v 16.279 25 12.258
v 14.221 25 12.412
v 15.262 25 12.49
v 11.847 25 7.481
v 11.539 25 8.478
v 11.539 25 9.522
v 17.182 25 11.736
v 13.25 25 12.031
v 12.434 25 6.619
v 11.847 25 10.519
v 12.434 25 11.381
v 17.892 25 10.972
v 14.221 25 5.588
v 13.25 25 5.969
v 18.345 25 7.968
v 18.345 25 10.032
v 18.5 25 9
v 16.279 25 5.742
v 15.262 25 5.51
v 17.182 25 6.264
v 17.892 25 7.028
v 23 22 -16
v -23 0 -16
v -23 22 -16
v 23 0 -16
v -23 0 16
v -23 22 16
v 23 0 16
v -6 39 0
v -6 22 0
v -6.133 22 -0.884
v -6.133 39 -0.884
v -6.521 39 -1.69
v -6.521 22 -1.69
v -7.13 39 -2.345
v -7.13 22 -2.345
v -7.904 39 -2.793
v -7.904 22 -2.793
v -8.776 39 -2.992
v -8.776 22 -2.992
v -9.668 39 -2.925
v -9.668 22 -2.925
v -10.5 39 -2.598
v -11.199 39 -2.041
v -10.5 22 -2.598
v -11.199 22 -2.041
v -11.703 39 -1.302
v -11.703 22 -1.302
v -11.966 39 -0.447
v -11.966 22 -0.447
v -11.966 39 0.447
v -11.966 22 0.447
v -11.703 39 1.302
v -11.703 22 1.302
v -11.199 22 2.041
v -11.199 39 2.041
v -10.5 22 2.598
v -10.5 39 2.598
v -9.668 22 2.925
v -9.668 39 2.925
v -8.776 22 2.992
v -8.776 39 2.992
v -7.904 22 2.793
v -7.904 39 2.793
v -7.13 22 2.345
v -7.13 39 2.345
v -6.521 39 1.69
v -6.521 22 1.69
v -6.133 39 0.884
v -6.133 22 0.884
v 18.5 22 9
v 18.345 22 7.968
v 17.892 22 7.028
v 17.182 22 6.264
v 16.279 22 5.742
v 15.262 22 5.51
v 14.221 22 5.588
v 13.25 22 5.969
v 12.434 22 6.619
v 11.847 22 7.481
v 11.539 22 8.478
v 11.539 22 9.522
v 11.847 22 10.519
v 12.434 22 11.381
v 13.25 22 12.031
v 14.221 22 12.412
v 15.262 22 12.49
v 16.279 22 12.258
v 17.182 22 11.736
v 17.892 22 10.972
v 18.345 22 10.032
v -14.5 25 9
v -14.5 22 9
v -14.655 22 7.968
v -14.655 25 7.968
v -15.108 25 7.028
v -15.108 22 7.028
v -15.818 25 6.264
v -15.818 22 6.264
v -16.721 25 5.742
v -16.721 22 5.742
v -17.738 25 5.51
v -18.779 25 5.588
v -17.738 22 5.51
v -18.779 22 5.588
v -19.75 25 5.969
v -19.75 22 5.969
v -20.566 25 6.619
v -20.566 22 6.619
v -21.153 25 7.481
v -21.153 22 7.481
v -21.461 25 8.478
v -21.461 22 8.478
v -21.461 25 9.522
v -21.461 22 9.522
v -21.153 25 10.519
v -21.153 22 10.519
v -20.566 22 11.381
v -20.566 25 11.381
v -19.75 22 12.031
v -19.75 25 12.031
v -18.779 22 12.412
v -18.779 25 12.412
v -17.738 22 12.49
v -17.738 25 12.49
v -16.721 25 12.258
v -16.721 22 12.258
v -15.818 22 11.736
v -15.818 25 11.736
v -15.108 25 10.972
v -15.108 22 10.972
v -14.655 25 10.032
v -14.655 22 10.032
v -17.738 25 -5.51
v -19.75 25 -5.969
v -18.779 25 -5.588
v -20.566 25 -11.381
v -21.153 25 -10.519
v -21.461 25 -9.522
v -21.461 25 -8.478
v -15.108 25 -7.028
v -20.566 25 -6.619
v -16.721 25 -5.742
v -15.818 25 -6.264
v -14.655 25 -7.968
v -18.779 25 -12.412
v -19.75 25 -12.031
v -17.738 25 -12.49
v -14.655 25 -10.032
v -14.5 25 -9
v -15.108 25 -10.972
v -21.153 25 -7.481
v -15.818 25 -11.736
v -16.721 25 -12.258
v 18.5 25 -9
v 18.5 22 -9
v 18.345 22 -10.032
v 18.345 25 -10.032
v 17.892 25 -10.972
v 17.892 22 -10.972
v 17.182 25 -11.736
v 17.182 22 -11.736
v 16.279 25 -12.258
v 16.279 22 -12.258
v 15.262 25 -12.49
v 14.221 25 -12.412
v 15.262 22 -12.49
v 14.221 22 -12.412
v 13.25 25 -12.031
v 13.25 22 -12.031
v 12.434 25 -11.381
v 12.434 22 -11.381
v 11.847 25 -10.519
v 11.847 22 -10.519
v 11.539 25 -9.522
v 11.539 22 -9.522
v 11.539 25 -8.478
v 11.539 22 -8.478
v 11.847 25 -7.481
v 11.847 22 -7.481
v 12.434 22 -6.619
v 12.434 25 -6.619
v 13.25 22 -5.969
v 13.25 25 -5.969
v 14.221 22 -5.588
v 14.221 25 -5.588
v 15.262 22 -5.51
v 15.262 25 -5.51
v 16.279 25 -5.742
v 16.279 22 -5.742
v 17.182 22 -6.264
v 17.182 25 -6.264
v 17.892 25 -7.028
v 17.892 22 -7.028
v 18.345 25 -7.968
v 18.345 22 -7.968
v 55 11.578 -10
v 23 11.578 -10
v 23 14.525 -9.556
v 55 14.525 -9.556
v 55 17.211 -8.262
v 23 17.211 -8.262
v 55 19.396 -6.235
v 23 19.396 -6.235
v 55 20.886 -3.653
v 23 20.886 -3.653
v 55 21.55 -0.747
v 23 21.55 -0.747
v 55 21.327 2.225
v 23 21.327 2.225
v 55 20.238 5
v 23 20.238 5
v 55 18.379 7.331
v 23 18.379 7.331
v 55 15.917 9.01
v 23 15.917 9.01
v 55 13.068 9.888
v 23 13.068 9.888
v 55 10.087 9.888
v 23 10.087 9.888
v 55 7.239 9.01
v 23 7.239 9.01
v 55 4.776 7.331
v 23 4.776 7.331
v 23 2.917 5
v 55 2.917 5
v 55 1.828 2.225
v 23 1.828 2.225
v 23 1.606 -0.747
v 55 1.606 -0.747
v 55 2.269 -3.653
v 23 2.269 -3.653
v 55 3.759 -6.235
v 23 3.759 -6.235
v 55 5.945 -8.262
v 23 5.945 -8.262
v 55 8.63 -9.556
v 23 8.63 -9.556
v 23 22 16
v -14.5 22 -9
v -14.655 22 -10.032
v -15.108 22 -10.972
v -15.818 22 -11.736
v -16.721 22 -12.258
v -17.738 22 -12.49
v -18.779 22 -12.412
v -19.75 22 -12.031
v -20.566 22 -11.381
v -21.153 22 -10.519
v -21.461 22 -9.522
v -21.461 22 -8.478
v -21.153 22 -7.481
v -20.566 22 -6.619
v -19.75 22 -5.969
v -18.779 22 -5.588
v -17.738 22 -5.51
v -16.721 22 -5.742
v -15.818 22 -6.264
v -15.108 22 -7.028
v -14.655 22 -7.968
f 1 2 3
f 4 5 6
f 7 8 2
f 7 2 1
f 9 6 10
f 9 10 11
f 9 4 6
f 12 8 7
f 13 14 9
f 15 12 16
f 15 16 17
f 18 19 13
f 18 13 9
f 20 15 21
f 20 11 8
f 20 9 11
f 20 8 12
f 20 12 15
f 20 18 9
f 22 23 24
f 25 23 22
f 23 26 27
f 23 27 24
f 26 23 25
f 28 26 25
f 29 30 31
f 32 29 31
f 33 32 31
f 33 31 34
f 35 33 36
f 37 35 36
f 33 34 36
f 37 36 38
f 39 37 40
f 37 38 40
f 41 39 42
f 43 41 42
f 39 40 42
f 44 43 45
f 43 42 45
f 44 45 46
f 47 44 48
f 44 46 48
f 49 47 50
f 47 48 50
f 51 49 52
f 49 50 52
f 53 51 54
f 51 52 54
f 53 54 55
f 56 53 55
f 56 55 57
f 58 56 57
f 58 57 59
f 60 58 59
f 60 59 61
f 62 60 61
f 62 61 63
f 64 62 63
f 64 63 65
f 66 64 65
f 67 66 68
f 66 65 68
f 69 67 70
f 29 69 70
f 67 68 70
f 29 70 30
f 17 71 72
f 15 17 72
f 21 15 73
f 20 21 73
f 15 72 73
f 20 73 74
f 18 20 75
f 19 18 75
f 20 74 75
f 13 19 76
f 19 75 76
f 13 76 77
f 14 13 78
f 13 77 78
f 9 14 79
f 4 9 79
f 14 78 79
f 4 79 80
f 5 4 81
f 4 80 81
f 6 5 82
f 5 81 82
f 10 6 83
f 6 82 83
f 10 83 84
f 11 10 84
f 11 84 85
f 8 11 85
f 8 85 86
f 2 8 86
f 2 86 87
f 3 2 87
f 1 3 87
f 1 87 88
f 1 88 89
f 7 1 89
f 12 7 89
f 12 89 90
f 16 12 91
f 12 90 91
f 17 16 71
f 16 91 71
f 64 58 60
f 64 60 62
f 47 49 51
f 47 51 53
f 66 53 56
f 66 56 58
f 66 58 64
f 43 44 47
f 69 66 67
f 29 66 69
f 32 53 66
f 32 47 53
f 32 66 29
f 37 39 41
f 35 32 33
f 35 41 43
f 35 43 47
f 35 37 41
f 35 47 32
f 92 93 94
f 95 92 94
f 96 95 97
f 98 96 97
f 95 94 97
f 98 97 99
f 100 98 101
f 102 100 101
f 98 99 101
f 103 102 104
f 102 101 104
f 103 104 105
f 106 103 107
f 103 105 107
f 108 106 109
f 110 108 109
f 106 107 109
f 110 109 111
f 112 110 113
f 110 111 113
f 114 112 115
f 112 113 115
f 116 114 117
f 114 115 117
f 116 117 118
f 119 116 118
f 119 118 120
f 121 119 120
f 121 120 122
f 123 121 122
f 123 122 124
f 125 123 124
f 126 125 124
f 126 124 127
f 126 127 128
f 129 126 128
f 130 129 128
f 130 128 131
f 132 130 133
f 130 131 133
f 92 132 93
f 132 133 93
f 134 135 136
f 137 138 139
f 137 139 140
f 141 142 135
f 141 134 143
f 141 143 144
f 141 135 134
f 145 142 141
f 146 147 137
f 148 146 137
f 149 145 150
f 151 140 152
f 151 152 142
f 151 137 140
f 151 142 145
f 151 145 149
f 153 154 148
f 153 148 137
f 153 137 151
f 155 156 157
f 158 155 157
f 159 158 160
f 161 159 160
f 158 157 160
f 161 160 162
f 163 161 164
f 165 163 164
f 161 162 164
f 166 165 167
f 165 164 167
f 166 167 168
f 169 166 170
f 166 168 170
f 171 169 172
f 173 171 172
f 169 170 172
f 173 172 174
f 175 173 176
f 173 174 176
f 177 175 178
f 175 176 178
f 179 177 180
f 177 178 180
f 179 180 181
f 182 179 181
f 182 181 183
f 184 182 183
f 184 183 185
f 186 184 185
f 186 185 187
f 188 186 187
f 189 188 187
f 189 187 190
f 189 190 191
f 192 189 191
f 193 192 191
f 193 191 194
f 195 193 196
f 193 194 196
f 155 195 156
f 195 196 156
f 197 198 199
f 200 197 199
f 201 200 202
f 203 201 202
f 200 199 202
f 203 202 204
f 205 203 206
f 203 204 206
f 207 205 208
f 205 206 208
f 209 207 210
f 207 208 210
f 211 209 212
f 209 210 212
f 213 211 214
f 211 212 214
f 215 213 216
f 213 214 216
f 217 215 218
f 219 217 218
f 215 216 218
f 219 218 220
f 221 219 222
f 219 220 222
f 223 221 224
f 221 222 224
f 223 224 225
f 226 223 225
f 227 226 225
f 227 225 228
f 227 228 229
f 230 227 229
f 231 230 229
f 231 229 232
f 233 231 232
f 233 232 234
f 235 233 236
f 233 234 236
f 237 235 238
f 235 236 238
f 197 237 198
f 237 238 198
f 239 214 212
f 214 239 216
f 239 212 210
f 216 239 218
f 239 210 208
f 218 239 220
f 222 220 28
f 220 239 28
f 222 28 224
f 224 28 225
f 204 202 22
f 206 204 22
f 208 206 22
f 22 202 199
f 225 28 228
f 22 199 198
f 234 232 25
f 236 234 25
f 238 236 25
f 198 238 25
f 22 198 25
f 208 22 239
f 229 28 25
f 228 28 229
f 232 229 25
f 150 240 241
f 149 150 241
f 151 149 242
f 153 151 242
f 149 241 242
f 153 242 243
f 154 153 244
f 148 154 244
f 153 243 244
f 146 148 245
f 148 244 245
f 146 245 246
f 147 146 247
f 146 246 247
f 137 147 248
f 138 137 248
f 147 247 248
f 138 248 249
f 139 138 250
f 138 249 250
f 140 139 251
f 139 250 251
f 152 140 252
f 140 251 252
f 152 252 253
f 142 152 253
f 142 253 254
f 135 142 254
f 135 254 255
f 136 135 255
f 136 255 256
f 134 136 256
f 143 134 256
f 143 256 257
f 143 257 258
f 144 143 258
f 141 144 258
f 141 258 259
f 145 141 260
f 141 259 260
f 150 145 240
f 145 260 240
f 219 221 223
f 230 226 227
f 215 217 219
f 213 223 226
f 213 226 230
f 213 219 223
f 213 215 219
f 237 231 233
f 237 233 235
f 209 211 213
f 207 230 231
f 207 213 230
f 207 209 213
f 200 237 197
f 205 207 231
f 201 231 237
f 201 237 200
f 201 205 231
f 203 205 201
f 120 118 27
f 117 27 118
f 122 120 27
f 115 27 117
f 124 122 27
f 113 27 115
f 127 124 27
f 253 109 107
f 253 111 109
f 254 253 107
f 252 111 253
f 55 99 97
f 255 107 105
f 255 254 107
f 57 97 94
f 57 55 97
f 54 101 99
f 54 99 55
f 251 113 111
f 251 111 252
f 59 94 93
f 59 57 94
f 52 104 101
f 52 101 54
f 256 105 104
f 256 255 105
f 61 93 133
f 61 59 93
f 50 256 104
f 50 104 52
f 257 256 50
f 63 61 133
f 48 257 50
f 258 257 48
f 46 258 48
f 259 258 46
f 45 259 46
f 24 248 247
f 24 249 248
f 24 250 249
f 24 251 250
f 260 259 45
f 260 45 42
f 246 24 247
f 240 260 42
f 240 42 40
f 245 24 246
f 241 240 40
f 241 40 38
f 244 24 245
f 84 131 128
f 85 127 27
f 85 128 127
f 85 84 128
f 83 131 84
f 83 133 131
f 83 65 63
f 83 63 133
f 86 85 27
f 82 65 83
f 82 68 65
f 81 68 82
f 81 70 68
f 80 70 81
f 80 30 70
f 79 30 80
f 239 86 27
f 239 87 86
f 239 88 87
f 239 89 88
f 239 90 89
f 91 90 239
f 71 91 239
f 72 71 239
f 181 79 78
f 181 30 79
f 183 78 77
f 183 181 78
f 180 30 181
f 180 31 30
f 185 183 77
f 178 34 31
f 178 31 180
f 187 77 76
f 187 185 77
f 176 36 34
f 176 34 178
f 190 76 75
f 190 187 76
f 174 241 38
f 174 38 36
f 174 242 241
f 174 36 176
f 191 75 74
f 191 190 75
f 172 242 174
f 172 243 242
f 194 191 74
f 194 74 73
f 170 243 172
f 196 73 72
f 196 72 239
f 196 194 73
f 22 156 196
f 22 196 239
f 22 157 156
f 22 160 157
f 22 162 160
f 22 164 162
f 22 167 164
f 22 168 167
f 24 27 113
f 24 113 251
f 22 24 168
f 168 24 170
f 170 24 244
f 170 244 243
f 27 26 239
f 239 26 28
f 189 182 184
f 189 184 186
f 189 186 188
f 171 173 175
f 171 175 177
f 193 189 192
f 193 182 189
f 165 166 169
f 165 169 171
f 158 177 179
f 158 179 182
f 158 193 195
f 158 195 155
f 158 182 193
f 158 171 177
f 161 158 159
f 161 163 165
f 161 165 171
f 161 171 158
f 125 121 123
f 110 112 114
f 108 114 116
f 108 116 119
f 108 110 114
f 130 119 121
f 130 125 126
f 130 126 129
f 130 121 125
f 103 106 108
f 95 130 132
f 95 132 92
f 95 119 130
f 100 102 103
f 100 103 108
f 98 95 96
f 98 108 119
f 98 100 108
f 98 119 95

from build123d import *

# Parameters (mm, degrees)
SKETCH1_W           = 46
SKETCH1_H           = 32
BOSS_EXTRUDE1_DEPTH = 22
SKETCH3_R           = 10
BOSS_EXTRUDE3_DEPTH = 32
SKETCH4_R           = 3
BOSS_EXTRUDE4_DEPTH = 17
SKETCH5_R           = 3.5
BOSS_EXTRUDE6_DEPTH = 3


with BuildPart() as part:
    # Sketch1 → Boss-Extrude1 (new body)
    with BuildSketch(Plane(origin=(0, 0, 0), x_dir=(1, 0, 0), z_dir=(0, 1, 0))):
        Rectangle(SKETCH1_W, SKETCH1_H)
    extrude(amount=BOSS_EXTRUDE1_DEPTH)

    # Sketch3 → Boss-Extrude3 (add)
    with BuildSketch(Plane(origin=(23, 0, 0), x_dir=(0, 0, -1), z_dir=(1, 0, 0))):
        with Locations((0, 11.57774751)):
            Circle(SKETCH3_R)
    extrude(amount=BOSS_EXTRUDE3_DEPTH)

    # Sketch4 → Boss-Extrude4 (add)
    with BuildSketch(Plane(origin=(0, 22, 0), x_dir=(1, 0, 0), z_dir=(0, 1, 0))):
        with Locations((-9, 0)):
            Circle(SKETCH4_R)
    extrude(amount=BOSS_EXTRUDE4_DEPTH)

    # Sketch5 → Boss-Extrude6 (add)
    with BuildSketch(Plane(origin=(0, 22, 0), x_dir=(1, 0, 0), z_dir=(0, 1, 0))):
        with Locations((-18, -9)):
            Circle(SKETCH5_R)
        with Locations((15, 9)):
            Circle(SKETCH5_R)
        with Locations((15, -9)):
            Circle(SKETCH5_R)
        with Locations((-18, 9)):
            Circle(SKETCH5_R)
    extrude(amount=BOSS_EXTRUDE6_DEPTH)


solid = part.part
